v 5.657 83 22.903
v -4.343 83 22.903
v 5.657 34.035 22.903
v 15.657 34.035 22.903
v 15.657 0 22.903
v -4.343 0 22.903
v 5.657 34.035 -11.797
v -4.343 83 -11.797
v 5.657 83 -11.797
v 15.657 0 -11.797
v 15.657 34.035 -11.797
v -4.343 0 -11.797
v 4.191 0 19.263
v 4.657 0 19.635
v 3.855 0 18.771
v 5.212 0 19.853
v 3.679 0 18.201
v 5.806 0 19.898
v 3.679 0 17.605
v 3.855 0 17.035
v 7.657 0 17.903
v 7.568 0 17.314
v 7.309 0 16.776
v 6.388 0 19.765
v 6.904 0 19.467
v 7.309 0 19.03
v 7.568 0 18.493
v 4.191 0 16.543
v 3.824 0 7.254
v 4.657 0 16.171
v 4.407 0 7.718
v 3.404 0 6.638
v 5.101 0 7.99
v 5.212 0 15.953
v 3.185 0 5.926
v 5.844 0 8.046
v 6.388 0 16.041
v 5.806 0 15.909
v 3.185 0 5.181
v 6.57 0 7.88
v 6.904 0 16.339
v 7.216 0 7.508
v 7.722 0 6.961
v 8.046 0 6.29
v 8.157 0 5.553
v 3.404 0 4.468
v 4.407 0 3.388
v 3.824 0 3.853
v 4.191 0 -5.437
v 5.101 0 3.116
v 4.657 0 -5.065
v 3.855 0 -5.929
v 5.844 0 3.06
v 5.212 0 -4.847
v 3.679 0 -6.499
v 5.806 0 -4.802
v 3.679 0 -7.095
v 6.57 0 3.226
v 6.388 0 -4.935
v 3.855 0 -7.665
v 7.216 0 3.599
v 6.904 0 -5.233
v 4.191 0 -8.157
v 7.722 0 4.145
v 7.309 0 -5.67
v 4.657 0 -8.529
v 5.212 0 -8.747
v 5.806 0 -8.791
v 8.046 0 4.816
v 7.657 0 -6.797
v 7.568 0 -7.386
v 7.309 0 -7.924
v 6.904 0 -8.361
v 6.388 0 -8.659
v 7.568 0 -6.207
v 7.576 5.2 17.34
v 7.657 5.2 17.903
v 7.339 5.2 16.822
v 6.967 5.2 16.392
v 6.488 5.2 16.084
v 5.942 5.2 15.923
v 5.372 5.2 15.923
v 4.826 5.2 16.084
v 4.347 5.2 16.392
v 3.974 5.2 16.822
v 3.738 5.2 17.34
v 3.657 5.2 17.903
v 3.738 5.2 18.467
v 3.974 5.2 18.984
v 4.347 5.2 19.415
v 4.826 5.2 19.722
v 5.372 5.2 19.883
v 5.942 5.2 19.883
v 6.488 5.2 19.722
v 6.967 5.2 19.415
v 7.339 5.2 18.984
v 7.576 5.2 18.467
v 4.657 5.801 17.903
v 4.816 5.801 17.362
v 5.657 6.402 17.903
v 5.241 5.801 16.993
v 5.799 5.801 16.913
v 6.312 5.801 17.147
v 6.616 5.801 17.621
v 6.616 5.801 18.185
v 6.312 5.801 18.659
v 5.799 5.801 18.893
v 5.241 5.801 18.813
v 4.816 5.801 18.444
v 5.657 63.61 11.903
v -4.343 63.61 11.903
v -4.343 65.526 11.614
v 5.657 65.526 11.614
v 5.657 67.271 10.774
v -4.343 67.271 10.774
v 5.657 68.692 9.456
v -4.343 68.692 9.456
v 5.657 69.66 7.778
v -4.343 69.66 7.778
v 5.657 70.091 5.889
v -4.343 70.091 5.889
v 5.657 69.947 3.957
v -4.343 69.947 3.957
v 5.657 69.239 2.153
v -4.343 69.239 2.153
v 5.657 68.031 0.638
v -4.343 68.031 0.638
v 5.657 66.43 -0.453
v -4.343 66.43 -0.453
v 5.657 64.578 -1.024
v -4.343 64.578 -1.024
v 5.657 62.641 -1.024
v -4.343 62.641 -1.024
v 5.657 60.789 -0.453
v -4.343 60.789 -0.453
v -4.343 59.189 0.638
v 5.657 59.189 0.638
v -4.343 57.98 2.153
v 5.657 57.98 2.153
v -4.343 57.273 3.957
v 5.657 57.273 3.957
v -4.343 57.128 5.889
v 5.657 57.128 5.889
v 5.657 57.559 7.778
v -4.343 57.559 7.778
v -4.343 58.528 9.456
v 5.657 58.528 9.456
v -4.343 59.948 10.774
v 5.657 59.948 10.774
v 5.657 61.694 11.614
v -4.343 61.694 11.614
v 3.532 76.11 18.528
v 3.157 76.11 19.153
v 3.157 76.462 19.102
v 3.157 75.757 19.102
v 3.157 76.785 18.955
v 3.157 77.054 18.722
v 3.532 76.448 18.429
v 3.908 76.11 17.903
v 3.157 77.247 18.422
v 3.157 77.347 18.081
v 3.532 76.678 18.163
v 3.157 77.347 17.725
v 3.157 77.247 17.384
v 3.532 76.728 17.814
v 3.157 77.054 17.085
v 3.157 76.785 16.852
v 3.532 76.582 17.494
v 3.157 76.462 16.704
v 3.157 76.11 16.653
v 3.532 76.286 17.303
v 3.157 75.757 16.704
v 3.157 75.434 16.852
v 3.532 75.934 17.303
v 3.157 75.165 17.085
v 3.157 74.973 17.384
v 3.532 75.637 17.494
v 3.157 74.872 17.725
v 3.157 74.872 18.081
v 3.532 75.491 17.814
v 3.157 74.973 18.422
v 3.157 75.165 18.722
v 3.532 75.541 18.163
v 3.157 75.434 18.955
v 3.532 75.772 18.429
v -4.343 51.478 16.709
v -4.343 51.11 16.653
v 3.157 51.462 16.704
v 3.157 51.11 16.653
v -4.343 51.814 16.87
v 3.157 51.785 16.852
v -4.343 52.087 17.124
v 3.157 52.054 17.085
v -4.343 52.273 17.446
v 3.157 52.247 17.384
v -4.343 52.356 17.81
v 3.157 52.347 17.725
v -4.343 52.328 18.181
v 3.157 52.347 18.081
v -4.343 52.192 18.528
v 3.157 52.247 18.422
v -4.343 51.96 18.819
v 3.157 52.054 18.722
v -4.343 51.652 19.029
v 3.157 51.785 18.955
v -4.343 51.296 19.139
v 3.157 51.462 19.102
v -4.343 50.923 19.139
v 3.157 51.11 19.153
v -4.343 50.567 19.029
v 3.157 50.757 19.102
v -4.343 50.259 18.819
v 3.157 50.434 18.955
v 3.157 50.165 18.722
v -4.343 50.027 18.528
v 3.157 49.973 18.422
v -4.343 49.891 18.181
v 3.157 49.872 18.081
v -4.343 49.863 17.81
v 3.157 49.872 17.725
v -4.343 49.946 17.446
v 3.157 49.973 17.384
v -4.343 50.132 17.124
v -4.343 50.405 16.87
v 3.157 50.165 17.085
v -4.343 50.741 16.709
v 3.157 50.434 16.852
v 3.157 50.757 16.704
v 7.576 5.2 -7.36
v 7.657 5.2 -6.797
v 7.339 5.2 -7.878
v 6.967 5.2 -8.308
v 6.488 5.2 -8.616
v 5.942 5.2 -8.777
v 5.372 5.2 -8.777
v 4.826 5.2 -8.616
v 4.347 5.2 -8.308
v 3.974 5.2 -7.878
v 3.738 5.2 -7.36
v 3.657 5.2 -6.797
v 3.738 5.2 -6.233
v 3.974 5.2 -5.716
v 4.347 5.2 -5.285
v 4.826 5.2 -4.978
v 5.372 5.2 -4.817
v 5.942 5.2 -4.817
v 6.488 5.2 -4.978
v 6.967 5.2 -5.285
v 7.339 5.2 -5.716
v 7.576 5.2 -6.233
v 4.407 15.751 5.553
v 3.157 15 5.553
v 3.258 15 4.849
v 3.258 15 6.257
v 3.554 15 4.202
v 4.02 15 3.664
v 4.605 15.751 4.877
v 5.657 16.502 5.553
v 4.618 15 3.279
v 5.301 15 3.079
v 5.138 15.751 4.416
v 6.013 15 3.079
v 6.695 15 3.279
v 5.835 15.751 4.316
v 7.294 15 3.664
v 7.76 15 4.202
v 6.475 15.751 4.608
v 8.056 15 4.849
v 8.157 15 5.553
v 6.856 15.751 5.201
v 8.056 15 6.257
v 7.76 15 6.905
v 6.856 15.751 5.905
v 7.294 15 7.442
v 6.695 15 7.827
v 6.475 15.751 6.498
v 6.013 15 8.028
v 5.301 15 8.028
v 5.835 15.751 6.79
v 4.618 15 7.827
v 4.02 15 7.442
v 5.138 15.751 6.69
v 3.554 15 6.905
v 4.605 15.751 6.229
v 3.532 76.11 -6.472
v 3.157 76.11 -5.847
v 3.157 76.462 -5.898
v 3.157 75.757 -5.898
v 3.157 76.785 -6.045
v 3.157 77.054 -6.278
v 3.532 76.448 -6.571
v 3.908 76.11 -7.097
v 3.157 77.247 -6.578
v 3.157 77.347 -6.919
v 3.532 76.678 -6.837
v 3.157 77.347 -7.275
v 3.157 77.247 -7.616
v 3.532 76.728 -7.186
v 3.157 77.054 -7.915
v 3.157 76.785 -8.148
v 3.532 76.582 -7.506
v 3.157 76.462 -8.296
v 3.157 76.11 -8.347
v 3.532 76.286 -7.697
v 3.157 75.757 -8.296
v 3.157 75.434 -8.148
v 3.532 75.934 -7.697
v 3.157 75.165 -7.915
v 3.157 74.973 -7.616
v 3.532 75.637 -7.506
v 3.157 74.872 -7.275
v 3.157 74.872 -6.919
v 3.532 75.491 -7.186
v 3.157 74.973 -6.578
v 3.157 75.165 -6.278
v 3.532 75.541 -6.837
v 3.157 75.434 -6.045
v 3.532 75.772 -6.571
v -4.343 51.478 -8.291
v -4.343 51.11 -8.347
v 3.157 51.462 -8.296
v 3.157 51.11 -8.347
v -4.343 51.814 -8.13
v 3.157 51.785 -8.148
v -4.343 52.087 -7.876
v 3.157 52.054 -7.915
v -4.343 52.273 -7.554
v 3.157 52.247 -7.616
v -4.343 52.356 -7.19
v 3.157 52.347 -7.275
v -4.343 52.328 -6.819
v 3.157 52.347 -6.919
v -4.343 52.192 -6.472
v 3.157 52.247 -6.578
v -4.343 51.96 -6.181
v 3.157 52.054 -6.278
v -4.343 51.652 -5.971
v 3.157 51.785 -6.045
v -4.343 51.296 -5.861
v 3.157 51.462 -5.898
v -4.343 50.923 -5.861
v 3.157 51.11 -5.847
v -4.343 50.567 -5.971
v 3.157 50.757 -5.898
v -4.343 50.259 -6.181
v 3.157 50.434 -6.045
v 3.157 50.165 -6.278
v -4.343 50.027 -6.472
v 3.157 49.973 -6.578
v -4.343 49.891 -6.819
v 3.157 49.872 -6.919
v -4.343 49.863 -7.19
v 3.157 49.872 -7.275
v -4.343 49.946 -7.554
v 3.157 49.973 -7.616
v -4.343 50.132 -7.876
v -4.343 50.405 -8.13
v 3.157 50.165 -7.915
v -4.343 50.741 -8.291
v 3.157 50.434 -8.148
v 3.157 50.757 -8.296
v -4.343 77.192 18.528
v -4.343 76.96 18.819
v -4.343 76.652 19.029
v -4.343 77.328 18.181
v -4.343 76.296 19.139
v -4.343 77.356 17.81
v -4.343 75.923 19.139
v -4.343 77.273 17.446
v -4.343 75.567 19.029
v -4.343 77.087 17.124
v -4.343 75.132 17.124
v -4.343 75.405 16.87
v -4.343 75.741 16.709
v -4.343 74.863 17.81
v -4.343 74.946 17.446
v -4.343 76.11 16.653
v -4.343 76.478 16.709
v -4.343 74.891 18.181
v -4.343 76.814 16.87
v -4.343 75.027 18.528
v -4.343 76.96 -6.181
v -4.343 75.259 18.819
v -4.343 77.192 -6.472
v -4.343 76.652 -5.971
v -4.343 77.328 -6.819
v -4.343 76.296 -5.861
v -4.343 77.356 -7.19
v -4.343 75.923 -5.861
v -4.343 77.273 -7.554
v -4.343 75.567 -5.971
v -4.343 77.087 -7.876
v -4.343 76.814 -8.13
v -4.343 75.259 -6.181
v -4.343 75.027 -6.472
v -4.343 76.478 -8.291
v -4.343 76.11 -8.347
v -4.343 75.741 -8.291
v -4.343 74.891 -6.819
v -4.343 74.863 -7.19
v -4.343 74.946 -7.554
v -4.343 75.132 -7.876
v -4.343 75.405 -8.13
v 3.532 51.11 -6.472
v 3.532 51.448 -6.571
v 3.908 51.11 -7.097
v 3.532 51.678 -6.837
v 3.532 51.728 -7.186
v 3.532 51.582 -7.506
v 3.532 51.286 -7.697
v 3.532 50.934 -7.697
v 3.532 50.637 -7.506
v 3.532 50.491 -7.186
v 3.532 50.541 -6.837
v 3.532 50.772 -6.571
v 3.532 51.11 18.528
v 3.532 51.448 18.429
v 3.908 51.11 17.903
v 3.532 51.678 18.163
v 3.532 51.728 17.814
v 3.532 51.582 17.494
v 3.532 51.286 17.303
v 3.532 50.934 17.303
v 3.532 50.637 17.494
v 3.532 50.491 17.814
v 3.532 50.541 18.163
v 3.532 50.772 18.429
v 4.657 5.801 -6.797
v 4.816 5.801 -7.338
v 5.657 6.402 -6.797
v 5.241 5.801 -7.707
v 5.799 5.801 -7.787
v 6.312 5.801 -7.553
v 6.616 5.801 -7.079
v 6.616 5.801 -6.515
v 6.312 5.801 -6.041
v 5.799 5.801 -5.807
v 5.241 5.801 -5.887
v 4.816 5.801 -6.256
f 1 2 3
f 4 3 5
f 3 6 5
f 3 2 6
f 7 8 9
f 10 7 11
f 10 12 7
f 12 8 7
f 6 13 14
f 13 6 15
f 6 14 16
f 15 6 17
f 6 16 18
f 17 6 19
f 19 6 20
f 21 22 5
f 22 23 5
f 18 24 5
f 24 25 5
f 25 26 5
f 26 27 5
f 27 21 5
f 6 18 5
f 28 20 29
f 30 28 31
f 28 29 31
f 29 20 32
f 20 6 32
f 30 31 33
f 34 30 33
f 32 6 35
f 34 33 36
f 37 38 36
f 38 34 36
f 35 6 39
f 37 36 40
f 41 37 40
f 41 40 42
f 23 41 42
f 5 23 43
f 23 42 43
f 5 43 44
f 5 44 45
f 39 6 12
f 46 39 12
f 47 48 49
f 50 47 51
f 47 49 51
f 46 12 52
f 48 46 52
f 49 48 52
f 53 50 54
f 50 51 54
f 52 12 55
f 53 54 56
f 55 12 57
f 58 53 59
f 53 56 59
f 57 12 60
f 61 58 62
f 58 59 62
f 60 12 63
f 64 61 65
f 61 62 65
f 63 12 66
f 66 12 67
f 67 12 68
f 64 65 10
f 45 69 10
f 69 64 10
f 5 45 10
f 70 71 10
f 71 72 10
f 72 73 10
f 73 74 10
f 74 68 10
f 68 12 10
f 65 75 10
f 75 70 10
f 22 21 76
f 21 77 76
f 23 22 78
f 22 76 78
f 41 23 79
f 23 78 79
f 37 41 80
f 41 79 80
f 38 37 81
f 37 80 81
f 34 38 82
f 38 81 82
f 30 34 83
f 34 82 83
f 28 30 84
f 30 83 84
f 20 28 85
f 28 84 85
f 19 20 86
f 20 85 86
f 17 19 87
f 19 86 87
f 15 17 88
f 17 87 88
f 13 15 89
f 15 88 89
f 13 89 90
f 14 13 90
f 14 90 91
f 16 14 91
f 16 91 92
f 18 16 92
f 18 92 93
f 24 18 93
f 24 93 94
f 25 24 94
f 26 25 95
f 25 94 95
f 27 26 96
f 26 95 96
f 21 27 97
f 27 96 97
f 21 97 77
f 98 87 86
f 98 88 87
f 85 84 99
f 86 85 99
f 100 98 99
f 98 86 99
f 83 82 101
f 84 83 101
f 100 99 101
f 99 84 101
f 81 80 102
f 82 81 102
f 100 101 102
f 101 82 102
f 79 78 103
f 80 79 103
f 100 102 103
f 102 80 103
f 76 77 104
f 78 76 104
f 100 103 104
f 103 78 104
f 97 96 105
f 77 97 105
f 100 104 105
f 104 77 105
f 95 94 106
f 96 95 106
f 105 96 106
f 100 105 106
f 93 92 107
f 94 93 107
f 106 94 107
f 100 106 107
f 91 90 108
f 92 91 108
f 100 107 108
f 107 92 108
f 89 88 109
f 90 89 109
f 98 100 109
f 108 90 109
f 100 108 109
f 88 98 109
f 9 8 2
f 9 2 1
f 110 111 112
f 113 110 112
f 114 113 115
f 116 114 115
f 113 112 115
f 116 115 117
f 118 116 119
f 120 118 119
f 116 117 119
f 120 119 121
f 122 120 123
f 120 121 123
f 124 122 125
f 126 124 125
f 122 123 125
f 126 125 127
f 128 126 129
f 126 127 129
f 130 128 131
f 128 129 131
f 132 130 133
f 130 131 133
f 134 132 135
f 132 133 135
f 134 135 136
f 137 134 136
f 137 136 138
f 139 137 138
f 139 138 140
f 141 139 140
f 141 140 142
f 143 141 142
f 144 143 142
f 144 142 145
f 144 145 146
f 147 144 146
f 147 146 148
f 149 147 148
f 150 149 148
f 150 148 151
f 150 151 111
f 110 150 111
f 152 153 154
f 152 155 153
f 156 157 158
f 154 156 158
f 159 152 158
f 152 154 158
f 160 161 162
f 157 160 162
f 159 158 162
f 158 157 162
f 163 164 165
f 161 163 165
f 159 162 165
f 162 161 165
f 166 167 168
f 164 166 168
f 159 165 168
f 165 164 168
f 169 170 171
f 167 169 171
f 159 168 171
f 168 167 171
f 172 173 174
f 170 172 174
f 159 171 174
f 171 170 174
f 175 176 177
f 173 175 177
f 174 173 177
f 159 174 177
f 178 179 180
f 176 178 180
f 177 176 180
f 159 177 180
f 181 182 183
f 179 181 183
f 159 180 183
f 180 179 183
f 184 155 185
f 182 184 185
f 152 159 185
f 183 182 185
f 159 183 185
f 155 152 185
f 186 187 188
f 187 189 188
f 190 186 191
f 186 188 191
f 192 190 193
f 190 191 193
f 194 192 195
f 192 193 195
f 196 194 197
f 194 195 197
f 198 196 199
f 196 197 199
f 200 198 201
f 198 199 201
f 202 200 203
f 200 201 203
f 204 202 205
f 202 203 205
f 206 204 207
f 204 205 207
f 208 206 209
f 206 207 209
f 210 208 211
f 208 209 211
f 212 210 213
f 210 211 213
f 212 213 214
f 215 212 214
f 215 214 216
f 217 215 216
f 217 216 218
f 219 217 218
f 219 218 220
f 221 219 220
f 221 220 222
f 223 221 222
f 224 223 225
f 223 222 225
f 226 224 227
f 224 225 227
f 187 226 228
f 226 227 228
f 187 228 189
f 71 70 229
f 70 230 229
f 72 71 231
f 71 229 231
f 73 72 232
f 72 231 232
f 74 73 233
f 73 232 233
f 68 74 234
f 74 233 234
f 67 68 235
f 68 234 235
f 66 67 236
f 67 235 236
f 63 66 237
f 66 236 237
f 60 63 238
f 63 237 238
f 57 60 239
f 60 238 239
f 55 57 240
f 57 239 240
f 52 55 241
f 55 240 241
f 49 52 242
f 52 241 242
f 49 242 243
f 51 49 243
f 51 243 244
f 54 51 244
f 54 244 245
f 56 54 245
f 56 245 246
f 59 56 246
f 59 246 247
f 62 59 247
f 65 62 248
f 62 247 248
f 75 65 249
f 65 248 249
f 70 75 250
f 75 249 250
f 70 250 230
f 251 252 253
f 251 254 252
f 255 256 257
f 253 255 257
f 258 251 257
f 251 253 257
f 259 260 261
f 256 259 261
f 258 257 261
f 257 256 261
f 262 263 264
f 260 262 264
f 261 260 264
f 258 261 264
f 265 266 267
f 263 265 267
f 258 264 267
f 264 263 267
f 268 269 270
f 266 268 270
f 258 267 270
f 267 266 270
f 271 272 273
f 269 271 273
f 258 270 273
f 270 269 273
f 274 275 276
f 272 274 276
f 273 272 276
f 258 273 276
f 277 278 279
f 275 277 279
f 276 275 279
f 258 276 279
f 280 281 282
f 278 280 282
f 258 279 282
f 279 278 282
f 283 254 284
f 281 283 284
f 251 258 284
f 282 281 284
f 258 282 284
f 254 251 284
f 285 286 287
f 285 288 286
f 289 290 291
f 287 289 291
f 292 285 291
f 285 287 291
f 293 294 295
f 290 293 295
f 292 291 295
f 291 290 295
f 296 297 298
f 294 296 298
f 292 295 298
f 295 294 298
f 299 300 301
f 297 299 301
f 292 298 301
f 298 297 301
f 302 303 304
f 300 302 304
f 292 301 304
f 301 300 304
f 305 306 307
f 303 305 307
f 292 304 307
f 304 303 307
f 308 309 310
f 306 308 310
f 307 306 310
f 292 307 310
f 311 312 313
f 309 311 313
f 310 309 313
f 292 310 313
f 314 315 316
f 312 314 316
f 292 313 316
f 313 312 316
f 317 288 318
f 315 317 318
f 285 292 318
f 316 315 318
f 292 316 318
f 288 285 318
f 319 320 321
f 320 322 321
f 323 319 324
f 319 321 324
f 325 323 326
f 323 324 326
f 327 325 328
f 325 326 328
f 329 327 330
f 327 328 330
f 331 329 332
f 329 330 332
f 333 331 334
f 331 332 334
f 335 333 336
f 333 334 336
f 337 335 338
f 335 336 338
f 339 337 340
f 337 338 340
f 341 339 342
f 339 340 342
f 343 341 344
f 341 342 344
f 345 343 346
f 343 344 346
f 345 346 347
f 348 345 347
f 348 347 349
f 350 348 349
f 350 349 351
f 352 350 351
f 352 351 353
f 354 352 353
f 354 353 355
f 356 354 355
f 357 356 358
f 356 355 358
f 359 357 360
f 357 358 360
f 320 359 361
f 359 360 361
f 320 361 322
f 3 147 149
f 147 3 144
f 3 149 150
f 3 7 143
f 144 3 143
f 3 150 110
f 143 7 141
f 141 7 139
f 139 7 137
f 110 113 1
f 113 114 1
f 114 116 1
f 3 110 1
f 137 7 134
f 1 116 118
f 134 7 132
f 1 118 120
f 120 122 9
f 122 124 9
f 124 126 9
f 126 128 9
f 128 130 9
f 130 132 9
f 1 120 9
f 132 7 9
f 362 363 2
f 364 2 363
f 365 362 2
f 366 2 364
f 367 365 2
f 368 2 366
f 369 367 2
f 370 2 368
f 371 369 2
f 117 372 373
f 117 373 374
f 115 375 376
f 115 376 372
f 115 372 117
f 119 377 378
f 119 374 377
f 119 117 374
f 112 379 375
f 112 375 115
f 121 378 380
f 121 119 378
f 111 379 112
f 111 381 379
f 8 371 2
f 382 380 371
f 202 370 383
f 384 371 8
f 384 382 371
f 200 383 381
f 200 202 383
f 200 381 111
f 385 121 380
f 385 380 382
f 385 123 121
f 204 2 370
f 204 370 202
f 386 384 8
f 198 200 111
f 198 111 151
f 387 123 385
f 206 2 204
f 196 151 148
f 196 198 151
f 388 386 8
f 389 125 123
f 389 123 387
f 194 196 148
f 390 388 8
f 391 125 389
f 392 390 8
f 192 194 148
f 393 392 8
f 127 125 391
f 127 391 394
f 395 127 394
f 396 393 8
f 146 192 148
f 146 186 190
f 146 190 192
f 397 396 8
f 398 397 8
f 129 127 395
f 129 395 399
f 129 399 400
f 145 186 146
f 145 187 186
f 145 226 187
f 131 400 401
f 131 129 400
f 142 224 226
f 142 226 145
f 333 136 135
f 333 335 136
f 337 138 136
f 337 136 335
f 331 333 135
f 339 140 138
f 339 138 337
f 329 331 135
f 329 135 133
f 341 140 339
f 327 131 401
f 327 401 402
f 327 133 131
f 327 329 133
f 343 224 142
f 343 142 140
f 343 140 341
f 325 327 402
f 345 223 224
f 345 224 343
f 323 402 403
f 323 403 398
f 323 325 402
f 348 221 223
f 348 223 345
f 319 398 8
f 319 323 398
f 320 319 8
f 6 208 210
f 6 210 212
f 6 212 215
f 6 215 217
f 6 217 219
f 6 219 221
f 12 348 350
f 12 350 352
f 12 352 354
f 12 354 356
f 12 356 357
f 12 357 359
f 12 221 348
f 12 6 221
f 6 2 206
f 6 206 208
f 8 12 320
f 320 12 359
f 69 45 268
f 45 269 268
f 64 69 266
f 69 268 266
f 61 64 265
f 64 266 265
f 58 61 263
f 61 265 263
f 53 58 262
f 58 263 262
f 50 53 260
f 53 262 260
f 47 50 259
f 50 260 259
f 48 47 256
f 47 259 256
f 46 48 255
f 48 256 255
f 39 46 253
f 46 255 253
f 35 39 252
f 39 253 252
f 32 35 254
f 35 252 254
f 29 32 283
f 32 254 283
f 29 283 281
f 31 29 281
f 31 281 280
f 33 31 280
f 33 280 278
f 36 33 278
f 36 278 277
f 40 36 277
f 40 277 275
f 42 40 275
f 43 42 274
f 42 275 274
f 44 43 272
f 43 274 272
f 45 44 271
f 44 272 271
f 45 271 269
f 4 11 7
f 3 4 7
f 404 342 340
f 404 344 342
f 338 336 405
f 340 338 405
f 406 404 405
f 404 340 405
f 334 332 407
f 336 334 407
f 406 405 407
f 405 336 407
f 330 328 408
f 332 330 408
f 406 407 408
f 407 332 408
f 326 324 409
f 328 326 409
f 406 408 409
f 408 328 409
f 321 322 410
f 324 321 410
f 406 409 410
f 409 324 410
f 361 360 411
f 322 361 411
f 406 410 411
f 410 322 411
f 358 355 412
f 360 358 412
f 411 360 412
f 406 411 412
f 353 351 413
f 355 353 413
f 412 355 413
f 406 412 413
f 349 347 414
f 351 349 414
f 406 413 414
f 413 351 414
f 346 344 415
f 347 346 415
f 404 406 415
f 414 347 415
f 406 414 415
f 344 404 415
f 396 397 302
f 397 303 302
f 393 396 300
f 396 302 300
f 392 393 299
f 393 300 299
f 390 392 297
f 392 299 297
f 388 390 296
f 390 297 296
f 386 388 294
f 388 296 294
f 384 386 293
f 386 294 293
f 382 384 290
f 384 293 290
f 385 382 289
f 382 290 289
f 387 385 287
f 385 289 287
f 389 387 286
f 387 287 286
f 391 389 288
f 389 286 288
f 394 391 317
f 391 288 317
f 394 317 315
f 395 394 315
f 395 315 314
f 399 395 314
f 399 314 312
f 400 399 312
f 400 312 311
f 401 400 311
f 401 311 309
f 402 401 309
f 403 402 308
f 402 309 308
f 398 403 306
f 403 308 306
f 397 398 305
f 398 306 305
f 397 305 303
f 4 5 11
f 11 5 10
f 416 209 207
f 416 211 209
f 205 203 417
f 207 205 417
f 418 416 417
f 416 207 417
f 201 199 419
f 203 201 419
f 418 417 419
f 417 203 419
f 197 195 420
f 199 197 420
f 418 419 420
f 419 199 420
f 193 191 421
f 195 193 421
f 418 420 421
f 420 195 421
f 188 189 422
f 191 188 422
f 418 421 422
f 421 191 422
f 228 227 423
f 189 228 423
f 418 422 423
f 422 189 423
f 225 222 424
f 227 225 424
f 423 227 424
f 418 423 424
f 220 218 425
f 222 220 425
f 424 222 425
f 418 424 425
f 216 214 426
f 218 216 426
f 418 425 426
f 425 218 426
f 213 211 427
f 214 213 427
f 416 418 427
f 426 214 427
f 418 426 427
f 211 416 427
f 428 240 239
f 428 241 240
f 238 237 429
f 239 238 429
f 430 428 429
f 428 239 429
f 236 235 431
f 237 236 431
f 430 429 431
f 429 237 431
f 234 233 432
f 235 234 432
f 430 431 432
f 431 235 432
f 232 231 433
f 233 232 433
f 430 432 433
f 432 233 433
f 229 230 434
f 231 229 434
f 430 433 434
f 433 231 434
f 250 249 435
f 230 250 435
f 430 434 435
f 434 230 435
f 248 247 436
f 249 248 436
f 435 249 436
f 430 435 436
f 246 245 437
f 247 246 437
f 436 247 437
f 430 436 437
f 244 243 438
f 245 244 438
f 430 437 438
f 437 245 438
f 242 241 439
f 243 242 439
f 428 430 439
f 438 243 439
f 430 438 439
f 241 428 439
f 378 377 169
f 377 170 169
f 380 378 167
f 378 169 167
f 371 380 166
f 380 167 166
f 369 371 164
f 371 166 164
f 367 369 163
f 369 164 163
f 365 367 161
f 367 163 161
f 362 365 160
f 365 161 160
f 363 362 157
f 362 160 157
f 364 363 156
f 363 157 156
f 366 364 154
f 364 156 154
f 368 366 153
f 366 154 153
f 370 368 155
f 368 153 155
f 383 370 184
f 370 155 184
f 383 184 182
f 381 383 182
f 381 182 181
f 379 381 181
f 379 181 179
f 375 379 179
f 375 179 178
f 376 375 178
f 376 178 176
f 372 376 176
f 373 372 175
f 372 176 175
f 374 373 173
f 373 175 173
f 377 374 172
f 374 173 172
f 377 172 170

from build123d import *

# Parameters (mm, degrees)
SKETCH1_W                 = 20
SKETCH1_H                 = 34.7
BOSS_EXTRUDE1_DEPTH       = 83
CUT_EXTRUDE2_REACH        = 36.7
SKETCH3_W                 = 10
SKETCH3_H                 = 48.965000852
CUT_EXTRUDE3_REACH        = 22
SKETCH4_R                 = 6.5
M3X0_5_TAPPED_HOLE1_D     = 2.5
M3X0_5_TAPPED_HOLE1_DEPTH = 7.5
M3X0_5_TAPPED_HOLE1_TIP   = 0.751075774
M6X1_0_TAPPED_HOLE1_D     = 5
M6X1_0_TAPPED_HOLE1_DEPTH = 15
M6X1_0_TAPPED_HOLE1_TIP   = 1.502151548
F_4_0MM_DOWEL_HOLE1_D     = 4
F_4_0MM_DOWEL_HOLE1_DEPTH = 5.2
F_4_0MM_DOWEL_HOLE1_TIP   = 1.201721238


with BuildPart() as part:
    # Sketch1 → Boss-Extrude1 (new body)
    with BuildSketch(Plane(origin=(0, 0, 0), x_dir=(1, 0, 0), z_dir=(0, 1, 0))):
        with Locations((5.656892123, -5.553125)):
            Rectangle(SKETCH1_W, SKETCH1_H)
    extrude(amount=BOSS_EXTRUDE1_DEPTH)

    # Sketch3 → Cut-Extrude2 (cut, up to next)
    with BuildSketch(Plane(origin=(0, 0, -11.796875), x_dir=(-1, 0, 0), z_dir=(0, 0, -1)), mode=Mode.PRIVATE) as cut_extrude2_sk1:
        with Locations((-10.656892123, 58.517499574)):
            Rectangle(SKETCH3_W, SKETCH3_H)
    cut_extrude2_tool1 = extrude(cut_extrude2_sk1.sketch, amount=-CUT_EXTRUDE2_REACH, mode=Mode.PRIVATE) & part.part
    add(cut_extrude2_tool1.solids().sort_by_distance((10.656892, 58.5175, -11.796875))[0], mode=Mode.SUBTRACT)

    # Sketch4 → Cut-Extrude3 (cut, up to next)
    with BuildSketch(Plane.ZY.offset(4.343107877), mode=Mode.PRIVATE) as cut_extrude3_sk1:
        with Locations((5.403125, 63.609645263)):
            Circle(SKETCH4_R)
    cut_extrude3_tool1 = extrude(cut_extrude3_sk1.sketch, amount=-CUT_EXTRUDE3_REACH, mode=Mode.PRIVATE) & part.part
    add(cut_extrude3_tool1.solids().sort_by_distance((-4.343108, 63.609645, 5.403125))[0], mode=Mode.SUBTRACT)

    # M3x0.5 Tapped Hole1
    with Locations(Plane.ZY.offset(4.343107877)):
        with Locations((-7.096875, 51.109645263), (17.903125, 51.109645263), (17.903125, 76.109645263), (-7.096875, 76.109645263)):
            Hole(M3X0_5_TAPPED_HOLE1_D / 2, depth=M3X0_5_TAPPED_HOLE1_DEPTH)
            with Locations((0, 0, -(M3X0_5_TAPPED_HOLE1_DEPTH + M3X0_5_TAPPED_HOLE1_TIP / 2))):  # 118° drill point
                Cone(0, M3X0_5_TAPPED_HOLE1_D / 2, M3X0_5_TAPPED_HOLE1_TIP, mode=Mode.SUBTRACT)

    # M6x1.0 Tapped Hole1
    with Locations(Plane(origin=(0, 0, 0), x_dir=(-1, 0, 0), z_dir=(0, -1, 0))):
        with Locations((-5.656892123, -5.553125)):
            Hole(M6X1_0_TAPPED_HOLE1_D / 2, depth=M6X1_0_TAPPED_HOLE1_DEPTH)
            with Locations((0, 0, -(M6X1_0_TAPPED_HOLE1_DEPTH + M6X1_0_TAPPED_HOLE1_TIP / 2))):  # 118° drill point
                Cone(0, M6X1_0_TAPPED_HOLE1_D / 2, M6X1_0_TAPPED_HOLE1_TIP, mode=Mode.SUBTRACT)

    # Ø4.0mm Dowel Hole1
    with Locations(Plane(origin=(0, 0, 0), x_dir=(-1, 0, 0), z_dir=(0, -1, 0))):
        with Locations((-5.656892123, -17.903125), (-5.656892123, 6.796875)):
            Hole(F_4_0MM_DOWEL_HOLE1_D / 2, depth=F_4_0MM_DOWEL_HOLE1_DEPTH)
            with Locations((0, 0, -(F_4_0MM_DOWEL_HOLE1_DEPTH + F_4_0MM_DOWEL_HOLE1_TIP / 2))):  # 118° drill point
                Cone(0, F_4_0MM_DOWEL_HOLE1_D / 2, F_4_0MM_DOWEL_HOLE1_TIP, mode=Mode.SUBTRACT)


solid = part.part
